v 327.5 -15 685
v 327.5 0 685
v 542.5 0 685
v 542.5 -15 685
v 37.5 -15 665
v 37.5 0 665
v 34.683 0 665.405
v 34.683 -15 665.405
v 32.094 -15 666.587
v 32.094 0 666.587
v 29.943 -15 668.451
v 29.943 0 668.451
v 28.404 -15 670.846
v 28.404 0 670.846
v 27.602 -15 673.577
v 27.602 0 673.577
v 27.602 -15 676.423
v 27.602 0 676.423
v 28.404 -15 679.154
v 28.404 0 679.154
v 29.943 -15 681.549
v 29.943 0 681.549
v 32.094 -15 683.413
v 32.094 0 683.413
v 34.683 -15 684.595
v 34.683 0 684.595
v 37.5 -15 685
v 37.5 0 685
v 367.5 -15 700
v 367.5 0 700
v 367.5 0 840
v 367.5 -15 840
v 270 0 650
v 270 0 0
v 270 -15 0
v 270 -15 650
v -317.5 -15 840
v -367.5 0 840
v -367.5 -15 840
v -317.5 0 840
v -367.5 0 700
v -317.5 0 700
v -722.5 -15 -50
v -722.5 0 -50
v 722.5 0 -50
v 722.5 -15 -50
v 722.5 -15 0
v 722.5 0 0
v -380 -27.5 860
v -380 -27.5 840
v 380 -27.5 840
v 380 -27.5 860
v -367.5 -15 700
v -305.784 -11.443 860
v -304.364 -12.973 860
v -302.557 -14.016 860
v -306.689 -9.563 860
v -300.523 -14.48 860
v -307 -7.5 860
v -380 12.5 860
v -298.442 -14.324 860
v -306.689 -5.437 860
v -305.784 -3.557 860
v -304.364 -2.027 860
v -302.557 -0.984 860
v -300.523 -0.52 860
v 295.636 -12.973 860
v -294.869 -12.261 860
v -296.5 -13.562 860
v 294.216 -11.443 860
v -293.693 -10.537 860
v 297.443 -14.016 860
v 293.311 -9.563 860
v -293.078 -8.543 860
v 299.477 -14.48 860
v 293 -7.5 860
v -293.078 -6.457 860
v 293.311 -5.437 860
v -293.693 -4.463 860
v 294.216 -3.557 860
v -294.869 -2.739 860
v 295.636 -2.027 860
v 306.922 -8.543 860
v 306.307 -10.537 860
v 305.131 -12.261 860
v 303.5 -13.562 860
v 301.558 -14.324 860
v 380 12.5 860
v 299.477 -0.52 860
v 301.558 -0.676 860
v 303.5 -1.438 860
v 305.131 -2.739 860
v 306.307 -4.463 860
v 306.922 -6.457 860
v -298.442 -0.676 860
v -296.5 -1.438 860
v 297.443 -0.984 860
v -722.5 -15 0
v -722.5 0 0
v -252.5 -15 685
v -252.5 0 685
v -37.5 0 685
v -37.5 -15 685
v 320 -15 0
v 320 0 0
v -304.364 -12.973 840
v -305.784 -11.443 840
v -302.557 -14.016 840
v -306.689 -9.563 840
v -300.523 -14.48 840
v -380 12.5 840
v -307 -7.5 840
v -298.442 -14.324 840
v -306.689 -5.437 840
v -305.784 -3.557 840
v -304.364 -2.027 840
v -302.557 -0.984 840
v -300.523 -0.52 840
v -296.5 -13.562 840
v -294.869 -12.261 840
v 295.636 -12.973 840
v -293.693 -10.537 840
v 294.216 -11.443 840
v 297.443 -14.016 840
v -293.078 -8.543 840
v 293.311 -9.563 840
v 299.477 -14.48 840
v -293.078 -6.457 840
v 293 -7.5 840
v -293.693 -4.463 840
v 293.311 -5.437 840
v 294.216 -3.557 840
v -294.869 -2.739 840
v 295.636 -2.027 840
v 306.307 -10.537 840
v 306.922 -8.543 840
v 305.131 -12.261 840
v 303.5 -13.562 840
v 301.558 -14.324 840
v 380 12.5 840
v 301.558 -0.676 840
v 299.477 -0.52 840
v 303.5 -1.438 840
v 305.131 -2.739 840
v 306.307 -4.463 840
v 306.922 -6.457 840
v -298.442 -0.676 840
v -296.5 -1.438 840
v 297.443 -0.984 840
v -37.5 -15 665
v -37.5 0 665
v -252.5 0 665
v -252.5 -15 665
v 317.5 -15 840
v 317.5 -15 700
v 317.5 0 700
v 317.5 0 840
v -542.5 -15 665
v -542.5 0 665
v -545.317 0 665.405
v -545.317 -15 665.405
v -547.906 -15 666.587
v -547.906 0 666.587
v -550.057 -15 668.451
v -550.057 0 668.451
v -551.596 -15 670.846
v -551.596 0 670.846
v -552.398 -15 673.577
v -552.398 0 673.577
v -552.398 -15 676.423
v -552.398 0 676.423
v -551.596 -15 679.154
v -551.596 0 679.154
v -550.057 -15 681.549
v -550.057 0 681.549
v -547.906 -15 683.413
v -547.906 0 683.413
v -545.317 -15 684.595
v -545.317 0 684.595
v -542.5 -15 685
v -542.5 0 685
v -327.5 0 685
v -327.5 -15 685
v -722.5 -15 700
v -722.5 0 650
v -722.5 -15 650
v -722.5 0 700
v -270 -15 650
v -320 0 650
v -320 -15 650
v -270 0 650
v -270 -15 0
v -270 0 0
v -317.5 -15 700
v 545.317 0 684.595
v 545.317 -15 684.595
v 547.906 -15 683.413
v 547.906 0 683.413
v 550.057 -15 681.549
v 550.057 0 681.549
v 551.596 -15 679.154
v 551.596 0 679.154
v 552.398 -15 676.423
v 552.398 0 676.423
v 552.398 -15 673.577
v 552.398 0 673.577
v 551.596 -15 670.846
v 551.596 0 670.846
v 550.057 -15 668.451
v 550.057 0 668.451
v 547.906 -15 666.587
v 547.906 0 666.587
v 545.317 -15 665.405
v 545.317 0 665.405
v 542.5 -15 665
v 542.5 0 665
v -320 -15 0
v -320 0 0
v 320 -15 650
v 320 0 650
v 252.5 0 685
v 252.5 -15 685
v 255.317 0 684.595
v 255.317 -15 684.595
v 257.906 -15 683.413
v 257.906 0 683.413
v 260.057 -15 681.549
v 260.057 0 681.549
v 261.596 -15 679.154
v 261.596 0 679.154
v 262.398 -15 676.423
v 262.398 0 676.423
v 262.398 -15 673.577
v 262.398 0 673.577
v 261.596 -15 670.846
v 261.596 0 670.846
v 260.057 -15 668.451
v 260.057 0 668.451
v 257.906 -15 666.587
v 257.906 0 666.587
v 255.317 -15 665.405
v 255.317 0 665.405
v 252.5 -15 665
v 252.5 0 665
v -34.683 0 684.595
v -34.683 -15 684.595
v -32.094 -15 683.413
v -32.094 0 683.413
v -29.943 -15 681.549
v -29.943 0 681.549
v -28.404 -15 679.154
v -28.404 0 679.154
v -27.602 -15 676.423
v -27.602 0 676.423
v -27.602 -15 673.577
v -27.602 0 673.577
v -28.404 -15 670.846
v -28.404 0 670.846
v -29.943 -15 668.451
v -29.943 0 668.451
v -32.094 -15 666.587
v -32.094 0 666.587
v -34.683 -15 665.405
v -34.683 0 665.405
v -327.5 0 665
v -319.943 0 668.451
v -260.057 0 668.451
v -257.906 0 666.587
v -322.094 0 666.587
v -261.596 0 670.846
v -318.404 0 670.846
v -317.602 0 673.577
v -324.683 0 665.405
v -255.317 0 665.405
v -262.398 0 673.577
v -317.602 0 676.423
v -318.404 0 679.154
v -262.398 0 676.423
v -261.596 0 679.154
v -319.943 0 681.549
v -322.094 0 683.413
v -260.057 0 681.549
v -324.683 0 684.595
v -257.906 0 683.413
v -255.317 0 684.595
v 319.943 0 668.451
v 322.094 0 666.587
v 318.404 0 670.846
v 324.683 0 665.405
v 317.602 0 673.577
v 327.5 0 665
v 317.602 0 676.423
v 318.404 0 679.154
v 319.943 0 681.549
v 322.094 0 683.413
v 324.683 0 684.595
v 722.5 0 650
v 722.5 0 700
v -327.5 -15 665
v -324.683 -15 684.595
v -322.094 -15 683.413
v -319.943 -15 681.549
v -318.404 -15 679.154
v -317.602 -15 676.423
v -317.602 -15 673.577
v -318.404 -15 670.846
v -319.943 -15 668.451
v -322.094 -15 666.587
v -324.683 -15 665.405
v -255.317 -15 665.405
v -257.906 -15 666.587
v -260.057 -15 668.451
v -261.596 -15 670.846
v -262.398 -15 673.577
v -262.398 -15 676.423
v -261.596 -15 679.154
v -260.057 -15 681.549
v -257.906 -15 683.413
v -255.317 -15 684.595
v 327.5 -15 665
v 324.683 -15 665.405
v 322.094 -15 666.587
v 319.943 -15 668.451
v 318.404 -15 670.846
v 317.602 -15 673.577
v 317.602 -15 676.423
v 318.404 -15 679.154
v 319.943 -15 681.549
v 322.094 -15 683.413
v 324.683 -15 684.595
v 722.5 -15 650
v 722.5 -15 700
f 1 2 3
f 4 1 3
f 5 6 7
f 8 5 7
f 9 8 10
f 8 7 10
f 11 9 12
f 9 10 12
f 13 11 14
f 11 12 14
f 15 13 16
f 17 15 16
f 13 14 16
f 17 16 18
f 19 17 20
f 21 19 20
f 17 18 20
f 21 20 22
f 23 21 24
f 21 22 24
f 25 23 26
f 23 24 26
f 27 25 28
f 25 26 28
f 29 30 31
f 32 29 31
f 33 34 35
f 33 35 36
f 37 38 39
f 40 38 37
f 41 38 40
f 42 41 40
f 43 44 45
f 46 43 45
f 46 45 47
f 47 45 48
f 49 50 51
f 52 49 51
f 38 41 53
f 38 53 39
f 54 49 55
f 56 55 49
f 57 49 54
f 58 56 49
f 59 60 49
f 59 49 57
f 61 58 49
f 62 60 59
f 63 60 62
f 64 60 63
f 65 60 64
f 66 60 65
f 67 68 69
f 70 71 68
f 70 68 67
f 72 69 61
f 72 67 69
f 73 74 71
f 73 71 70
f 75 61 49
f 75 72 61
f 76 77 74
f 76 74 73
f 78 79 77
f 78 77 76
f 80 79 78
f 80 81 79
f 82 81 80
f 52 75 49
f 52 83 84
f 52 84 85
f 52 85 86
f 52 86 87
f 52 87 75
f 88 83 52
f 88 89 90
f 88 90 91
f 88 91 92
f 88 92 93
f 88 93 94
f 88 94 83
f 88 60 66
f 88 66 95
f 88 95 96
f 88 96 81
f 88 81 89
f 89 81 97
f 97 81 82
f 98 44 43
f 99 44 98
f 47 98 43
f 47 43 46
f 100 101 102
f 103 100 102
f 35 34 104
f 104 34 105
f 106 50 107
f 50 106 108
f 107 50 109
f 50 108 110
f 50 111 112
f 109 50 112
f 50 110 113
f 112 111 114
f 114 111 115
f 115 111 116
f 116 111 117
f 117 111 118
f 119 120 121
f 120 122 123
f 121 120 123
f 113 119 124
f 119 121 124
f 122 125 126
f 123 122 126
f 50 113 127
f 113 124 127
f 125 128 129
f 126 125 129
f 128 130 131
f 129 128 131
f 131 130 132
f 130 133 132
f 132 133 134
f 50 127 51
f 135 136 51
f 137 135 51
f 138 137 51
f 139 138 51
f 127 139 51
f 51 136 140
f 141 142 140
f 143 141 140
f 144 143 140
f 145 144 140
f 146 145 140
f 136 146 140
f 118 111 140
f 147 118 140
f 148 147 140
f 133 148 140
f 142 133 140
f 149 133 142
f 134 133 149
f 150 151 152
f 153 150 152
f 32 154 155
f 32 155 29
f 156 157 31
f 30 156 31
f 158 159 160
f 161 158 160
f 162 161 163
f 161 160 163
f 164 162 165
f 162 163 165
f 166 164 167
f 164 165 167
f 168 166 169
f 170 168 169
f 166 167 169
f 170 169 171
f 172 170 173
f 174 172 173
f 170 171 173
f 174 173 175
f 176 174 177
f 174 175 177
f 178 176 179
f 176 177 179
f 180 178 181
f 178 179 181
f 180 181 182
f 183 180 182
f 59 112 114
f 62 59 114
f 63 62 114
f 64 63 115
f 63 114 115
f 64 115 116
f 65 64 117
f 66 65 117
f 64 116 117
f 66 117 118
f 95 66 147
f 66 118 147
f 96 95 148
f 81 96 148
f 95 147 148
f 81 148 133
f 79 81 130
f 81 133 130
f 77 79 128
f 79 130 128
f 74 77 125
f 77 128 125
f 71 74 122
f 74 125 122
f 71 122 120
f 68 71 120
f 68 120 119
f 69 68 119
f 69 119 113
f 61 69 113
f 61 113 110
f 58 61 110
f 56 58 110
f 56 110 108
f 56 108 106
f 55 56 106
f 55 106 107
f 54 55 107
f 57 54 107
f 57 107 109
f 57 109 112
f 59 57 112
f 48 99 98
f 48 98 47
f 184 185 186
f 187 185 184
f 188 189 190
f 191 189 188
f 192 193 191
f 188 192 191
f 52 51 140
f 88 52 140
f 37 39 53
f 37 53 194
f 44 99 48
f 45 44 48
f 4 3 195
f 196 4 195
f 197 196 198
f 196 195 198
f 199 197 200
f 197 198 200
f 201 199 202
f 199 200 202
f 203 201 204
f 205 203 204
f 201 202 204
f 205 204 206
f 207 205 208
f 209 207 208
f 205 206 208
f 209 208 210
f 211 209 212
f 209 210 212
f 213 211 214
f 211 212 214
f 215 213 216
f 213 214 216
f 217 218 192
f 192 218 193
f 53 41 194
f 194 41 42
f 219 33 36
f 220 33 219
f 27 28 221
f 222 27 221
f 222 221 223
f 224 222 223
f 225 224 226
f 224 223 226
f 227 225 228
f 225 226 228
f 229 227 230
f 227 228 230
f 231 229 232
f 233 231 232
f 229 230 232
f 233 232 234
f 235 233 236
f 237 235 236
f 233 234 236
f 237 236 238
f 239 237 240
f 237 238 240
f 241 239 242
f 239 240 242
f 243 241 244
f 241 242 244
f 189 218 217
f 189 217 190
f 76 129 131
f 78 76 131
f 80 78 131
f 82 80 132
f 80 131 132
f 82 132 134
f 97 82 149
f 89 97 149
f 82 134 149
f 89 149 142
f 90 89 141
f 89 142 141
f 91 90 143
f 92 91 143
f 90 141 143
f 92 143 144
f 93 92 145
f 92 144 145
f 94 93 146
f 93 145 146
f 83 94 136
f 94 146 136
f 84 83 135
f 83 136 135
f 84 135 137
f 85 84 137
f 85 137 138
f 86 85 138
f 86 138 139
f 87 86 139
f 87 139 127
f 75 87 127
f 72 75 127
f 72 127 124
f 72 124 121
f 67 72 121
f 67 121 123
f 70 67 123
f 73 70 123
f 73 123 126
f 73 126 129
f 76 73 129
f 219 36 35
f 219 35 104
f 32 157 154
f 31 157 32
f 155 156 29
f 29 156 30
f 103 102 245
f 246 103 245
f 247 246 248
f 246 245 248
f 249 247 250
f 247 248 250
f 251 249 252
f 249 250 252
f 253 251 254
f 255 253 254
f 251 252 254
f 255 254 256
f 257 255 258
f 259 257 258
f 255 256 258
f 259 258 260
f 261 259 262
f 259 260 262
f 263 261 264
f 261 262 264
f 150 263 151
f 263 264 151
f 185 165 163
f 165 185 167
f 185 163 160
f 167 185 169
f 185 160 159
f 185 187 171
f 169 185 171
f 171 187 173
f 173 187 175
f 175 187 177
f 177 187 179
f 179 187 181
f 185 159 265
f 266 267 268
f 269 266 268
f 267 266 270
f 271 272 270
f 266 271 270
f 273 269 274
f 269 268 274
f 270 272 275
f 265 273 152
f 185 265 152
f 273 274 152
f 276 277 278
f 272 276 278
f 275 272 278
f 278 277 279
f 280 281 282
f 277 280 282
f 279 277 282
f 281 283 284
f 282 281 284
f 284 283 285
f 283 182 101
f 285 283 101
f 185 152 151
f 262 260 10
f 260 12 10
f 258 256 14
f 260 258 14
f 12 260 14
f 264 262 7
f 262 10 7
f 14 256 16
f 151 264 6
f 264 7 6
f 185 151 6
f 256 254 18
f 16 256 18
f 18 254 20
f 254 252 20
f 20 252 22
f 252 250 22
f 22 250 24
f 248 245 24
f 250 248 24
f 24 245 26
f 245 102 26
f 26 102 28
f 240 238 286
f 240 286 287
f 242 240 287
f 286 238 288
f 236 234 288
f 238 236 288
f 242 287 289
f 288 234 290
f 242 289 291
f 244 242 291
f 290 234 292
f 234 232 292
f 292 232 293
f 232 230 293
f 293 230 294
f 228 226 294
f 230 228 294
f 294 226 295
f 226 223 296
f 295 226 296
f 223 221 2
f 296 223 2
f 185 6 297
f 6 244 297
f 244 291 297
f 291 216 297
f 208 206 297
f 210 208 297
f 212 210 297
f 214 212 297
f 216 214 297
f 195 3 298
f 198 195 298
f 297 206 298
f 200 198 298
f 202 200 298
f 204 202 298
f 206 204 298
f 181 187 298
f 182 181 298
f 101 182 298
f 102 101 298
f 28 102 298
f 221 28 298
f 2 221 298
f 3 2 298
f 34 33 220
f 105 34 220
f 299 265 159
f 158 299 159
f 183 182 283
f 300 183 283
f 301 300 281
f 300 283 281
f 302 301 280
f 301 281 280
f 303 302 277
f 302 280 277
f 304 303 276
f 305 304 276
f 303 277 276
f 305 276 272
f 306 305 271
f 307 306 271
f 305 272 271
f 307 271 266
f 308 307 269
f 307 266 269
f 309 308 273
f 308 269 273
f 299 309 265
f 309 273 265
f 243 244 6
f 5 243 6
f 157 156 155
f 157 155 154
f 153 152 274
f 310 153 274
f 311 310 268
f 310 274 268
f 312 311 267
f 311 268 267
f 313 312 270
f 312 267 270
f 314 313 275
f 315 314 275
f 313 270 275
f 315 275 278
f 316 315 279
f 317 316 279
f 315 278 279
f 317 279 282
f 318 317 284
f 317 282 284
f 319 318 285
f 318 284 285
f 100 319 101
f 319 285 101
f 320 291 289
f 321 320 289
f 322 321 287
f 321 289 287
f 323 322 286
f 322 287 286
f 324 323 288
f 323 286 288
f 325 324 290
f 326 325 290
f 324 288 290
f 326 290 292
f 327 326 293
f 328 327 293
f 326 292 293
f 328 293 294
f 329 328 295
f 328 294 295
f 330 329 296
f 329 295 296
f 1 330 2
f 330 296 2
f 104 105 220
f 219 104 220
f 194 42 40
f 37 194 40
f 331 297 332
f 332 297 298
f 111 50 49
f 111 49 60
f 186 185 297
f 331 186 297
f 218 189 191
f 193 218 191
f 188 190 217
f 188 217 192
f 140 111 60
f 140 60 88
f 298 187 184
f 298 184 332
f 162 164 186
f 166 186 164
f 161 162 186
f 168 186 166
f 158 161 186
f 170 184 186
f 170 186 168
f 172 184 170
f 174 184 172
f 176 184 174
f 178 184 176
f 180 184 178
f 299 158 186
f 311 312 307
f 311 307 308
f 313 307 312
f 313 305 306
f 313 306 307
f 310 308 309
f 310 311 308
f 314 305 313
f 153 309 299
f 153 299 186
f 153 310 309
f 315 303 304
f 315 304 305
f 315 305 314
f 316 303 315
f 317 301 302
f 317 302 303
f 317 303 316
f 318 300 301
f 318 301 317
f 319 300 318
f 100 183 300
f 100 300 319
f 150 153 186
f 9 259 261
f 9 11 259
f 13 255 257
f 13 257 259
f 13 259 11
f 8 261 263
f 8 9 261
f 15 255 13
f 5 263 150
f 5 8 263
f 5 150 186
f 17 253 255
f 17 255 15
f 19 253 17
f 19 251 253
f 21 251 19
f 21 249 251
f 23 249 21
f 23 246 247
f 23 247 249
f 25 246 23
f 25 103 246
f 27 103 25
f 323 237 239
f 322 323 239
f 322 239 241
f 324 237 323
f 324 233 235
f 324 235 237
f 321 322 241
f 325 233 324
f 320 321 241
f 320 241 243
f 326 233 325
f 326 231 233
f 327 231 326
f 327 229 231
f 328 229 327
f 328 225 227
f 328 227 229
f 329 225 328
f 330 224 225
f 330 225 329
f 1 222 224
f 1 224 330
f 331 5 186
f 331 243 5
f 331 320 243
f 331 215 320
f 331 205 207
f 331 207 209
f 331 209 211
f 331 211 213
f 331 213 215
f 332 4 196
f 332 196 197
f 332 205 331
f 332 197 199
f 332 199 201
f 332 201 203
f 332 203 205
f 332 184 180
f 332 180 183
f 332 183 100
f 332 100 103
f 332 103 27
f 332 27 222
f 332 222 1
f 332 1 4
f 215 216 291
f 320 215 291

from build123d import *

# Parameters (mm, degrees)
F0_W     = 50
F0_H     = 650
F1_DEPTH = 15
F2_W     = 1445
F2_H     = 50
F3_DEPTH = 15
F4_W     = 50
F4_H     = 140
F5_DEPTH = 15
F6_W     = 760
F6_H     = 40
F7_DEPTH = 20
F9_D     = 14


with BuildPart() as f1:
    # F0 (on Front) → F1 (new body)
    with BuildSketch(Plane.XZ):
        with Locations((295, 325)):
            Rectangle(F0_W, F0_H)
    extrude(amount=F1_DEPTH)


with BuildPart() as f1b:
    # F0 (on Front) → F1, piece 2 (new body)
    with BuildSketch(Plane.XZ):
        with Locations((-295, 325)):
            Rectangle(F0_W, F0_H)
    extrude(amount=F1_DEPTH)


with BuildPart() as f3:
    # F2 (on Front) → F3 (new body)
    with BuildSketch(Plane.XZ):
        with Locations((0, 675)):
            Rectangle(F2_W, F2_H)
        with BuildLine():
            Line((-542.5, 685), (-327.5, 685))
            ThreePointArc((-327.5, 685), (-317.5, 675), (-327.5, 665))
            Line((-327.5, 665), (-542.5, 665))
            ThreePointArc((-542.5, 665), (-552.5, 675), (-542.5, 685))
        make_face(mode=Mode.SUBTRACT)
        with BuildLine():
            ThreePointArc((-37.5, 685), (-27.5, 675), (-37.5, 665))
            Line((-37.5, 665), (-252.5, 665))
            ThreePointArc((-252.5, 665), (-262.5, 675), (-252.5, 685))
            Line((-252.5, 685), (-37.5, 685))
        make_face(mode=Mode.SUBTRACT)
        with BuildLine():
            ThreePointArc((37.5, 665), (27.5, 675), (37.5, 685))
            Line((37.5, 685), (252.5, 685))
            ThreePointArc((252.5, 685), (262.5, 675), (252.5, 665))
            Line((252.5, 665), (37.5, 665))
        make_face(mode=Mode.SUBTRACT)
        with BuildLine():
            ThreePointArc((327.5, 665), (317.5, 675), (327.5, 685))
            Line((327.5, 685), (542.5, 685))
            ThreePointArc((542.5, 685), (552.5, 675), (542.5, 665))
            Line((542.5, 665), (327.5, 665))
        make_face(mode=Mode.SUBTRACT)
    extrude(amount=F3_DEPTH)


with BuildPart() as f3b:
    # F2 (on Front) → F3, piece 2 (new body)
    with BuildSketch(Plane.XZ):
        with Locations((0, -25)):
            Rectangle(F2_W, F2_H)
    extrude(amount=F3_DEPTH)


with BuildPart() as f5:
    # F4 (on Front) → F5 (new body)
    with BuildSketch(Plane.XZ):
        with Locations((-342.5, 770)):
            Rectangle(F4_W, F4_H)
    extrude(amount=F5_DEPTH)


with BuildPart() as f5b:
    # F4 (on Front) → F5, piece 2 (new body)
    with BuildSketch(Plane.XZ):
        with Locations((342.5, 770)):
            Rectangle(F4_W, F4_H)
    extrude(amount=F5_DEPTH)


with BuildPart() as f7:
    # F6 (on face) → F7 (new body)
    with BuildSketch(Plane.XY.offset(840)):
        with Locations((0, -7.5)):
            Rectangle(F6_W, F6_H)
    extrude(amount=F7_DEPTH)

    # F9 (through all)
    with Locations(Plane.XY.offset(860)):
        with Locations((-300, -7.5), (300, -7.5)):
            Hole(F9_D / 2)


solid = Compound([f1.part, f1b.part, f3.part, f3b.part, f5.part, f5b.part, f7.part])
